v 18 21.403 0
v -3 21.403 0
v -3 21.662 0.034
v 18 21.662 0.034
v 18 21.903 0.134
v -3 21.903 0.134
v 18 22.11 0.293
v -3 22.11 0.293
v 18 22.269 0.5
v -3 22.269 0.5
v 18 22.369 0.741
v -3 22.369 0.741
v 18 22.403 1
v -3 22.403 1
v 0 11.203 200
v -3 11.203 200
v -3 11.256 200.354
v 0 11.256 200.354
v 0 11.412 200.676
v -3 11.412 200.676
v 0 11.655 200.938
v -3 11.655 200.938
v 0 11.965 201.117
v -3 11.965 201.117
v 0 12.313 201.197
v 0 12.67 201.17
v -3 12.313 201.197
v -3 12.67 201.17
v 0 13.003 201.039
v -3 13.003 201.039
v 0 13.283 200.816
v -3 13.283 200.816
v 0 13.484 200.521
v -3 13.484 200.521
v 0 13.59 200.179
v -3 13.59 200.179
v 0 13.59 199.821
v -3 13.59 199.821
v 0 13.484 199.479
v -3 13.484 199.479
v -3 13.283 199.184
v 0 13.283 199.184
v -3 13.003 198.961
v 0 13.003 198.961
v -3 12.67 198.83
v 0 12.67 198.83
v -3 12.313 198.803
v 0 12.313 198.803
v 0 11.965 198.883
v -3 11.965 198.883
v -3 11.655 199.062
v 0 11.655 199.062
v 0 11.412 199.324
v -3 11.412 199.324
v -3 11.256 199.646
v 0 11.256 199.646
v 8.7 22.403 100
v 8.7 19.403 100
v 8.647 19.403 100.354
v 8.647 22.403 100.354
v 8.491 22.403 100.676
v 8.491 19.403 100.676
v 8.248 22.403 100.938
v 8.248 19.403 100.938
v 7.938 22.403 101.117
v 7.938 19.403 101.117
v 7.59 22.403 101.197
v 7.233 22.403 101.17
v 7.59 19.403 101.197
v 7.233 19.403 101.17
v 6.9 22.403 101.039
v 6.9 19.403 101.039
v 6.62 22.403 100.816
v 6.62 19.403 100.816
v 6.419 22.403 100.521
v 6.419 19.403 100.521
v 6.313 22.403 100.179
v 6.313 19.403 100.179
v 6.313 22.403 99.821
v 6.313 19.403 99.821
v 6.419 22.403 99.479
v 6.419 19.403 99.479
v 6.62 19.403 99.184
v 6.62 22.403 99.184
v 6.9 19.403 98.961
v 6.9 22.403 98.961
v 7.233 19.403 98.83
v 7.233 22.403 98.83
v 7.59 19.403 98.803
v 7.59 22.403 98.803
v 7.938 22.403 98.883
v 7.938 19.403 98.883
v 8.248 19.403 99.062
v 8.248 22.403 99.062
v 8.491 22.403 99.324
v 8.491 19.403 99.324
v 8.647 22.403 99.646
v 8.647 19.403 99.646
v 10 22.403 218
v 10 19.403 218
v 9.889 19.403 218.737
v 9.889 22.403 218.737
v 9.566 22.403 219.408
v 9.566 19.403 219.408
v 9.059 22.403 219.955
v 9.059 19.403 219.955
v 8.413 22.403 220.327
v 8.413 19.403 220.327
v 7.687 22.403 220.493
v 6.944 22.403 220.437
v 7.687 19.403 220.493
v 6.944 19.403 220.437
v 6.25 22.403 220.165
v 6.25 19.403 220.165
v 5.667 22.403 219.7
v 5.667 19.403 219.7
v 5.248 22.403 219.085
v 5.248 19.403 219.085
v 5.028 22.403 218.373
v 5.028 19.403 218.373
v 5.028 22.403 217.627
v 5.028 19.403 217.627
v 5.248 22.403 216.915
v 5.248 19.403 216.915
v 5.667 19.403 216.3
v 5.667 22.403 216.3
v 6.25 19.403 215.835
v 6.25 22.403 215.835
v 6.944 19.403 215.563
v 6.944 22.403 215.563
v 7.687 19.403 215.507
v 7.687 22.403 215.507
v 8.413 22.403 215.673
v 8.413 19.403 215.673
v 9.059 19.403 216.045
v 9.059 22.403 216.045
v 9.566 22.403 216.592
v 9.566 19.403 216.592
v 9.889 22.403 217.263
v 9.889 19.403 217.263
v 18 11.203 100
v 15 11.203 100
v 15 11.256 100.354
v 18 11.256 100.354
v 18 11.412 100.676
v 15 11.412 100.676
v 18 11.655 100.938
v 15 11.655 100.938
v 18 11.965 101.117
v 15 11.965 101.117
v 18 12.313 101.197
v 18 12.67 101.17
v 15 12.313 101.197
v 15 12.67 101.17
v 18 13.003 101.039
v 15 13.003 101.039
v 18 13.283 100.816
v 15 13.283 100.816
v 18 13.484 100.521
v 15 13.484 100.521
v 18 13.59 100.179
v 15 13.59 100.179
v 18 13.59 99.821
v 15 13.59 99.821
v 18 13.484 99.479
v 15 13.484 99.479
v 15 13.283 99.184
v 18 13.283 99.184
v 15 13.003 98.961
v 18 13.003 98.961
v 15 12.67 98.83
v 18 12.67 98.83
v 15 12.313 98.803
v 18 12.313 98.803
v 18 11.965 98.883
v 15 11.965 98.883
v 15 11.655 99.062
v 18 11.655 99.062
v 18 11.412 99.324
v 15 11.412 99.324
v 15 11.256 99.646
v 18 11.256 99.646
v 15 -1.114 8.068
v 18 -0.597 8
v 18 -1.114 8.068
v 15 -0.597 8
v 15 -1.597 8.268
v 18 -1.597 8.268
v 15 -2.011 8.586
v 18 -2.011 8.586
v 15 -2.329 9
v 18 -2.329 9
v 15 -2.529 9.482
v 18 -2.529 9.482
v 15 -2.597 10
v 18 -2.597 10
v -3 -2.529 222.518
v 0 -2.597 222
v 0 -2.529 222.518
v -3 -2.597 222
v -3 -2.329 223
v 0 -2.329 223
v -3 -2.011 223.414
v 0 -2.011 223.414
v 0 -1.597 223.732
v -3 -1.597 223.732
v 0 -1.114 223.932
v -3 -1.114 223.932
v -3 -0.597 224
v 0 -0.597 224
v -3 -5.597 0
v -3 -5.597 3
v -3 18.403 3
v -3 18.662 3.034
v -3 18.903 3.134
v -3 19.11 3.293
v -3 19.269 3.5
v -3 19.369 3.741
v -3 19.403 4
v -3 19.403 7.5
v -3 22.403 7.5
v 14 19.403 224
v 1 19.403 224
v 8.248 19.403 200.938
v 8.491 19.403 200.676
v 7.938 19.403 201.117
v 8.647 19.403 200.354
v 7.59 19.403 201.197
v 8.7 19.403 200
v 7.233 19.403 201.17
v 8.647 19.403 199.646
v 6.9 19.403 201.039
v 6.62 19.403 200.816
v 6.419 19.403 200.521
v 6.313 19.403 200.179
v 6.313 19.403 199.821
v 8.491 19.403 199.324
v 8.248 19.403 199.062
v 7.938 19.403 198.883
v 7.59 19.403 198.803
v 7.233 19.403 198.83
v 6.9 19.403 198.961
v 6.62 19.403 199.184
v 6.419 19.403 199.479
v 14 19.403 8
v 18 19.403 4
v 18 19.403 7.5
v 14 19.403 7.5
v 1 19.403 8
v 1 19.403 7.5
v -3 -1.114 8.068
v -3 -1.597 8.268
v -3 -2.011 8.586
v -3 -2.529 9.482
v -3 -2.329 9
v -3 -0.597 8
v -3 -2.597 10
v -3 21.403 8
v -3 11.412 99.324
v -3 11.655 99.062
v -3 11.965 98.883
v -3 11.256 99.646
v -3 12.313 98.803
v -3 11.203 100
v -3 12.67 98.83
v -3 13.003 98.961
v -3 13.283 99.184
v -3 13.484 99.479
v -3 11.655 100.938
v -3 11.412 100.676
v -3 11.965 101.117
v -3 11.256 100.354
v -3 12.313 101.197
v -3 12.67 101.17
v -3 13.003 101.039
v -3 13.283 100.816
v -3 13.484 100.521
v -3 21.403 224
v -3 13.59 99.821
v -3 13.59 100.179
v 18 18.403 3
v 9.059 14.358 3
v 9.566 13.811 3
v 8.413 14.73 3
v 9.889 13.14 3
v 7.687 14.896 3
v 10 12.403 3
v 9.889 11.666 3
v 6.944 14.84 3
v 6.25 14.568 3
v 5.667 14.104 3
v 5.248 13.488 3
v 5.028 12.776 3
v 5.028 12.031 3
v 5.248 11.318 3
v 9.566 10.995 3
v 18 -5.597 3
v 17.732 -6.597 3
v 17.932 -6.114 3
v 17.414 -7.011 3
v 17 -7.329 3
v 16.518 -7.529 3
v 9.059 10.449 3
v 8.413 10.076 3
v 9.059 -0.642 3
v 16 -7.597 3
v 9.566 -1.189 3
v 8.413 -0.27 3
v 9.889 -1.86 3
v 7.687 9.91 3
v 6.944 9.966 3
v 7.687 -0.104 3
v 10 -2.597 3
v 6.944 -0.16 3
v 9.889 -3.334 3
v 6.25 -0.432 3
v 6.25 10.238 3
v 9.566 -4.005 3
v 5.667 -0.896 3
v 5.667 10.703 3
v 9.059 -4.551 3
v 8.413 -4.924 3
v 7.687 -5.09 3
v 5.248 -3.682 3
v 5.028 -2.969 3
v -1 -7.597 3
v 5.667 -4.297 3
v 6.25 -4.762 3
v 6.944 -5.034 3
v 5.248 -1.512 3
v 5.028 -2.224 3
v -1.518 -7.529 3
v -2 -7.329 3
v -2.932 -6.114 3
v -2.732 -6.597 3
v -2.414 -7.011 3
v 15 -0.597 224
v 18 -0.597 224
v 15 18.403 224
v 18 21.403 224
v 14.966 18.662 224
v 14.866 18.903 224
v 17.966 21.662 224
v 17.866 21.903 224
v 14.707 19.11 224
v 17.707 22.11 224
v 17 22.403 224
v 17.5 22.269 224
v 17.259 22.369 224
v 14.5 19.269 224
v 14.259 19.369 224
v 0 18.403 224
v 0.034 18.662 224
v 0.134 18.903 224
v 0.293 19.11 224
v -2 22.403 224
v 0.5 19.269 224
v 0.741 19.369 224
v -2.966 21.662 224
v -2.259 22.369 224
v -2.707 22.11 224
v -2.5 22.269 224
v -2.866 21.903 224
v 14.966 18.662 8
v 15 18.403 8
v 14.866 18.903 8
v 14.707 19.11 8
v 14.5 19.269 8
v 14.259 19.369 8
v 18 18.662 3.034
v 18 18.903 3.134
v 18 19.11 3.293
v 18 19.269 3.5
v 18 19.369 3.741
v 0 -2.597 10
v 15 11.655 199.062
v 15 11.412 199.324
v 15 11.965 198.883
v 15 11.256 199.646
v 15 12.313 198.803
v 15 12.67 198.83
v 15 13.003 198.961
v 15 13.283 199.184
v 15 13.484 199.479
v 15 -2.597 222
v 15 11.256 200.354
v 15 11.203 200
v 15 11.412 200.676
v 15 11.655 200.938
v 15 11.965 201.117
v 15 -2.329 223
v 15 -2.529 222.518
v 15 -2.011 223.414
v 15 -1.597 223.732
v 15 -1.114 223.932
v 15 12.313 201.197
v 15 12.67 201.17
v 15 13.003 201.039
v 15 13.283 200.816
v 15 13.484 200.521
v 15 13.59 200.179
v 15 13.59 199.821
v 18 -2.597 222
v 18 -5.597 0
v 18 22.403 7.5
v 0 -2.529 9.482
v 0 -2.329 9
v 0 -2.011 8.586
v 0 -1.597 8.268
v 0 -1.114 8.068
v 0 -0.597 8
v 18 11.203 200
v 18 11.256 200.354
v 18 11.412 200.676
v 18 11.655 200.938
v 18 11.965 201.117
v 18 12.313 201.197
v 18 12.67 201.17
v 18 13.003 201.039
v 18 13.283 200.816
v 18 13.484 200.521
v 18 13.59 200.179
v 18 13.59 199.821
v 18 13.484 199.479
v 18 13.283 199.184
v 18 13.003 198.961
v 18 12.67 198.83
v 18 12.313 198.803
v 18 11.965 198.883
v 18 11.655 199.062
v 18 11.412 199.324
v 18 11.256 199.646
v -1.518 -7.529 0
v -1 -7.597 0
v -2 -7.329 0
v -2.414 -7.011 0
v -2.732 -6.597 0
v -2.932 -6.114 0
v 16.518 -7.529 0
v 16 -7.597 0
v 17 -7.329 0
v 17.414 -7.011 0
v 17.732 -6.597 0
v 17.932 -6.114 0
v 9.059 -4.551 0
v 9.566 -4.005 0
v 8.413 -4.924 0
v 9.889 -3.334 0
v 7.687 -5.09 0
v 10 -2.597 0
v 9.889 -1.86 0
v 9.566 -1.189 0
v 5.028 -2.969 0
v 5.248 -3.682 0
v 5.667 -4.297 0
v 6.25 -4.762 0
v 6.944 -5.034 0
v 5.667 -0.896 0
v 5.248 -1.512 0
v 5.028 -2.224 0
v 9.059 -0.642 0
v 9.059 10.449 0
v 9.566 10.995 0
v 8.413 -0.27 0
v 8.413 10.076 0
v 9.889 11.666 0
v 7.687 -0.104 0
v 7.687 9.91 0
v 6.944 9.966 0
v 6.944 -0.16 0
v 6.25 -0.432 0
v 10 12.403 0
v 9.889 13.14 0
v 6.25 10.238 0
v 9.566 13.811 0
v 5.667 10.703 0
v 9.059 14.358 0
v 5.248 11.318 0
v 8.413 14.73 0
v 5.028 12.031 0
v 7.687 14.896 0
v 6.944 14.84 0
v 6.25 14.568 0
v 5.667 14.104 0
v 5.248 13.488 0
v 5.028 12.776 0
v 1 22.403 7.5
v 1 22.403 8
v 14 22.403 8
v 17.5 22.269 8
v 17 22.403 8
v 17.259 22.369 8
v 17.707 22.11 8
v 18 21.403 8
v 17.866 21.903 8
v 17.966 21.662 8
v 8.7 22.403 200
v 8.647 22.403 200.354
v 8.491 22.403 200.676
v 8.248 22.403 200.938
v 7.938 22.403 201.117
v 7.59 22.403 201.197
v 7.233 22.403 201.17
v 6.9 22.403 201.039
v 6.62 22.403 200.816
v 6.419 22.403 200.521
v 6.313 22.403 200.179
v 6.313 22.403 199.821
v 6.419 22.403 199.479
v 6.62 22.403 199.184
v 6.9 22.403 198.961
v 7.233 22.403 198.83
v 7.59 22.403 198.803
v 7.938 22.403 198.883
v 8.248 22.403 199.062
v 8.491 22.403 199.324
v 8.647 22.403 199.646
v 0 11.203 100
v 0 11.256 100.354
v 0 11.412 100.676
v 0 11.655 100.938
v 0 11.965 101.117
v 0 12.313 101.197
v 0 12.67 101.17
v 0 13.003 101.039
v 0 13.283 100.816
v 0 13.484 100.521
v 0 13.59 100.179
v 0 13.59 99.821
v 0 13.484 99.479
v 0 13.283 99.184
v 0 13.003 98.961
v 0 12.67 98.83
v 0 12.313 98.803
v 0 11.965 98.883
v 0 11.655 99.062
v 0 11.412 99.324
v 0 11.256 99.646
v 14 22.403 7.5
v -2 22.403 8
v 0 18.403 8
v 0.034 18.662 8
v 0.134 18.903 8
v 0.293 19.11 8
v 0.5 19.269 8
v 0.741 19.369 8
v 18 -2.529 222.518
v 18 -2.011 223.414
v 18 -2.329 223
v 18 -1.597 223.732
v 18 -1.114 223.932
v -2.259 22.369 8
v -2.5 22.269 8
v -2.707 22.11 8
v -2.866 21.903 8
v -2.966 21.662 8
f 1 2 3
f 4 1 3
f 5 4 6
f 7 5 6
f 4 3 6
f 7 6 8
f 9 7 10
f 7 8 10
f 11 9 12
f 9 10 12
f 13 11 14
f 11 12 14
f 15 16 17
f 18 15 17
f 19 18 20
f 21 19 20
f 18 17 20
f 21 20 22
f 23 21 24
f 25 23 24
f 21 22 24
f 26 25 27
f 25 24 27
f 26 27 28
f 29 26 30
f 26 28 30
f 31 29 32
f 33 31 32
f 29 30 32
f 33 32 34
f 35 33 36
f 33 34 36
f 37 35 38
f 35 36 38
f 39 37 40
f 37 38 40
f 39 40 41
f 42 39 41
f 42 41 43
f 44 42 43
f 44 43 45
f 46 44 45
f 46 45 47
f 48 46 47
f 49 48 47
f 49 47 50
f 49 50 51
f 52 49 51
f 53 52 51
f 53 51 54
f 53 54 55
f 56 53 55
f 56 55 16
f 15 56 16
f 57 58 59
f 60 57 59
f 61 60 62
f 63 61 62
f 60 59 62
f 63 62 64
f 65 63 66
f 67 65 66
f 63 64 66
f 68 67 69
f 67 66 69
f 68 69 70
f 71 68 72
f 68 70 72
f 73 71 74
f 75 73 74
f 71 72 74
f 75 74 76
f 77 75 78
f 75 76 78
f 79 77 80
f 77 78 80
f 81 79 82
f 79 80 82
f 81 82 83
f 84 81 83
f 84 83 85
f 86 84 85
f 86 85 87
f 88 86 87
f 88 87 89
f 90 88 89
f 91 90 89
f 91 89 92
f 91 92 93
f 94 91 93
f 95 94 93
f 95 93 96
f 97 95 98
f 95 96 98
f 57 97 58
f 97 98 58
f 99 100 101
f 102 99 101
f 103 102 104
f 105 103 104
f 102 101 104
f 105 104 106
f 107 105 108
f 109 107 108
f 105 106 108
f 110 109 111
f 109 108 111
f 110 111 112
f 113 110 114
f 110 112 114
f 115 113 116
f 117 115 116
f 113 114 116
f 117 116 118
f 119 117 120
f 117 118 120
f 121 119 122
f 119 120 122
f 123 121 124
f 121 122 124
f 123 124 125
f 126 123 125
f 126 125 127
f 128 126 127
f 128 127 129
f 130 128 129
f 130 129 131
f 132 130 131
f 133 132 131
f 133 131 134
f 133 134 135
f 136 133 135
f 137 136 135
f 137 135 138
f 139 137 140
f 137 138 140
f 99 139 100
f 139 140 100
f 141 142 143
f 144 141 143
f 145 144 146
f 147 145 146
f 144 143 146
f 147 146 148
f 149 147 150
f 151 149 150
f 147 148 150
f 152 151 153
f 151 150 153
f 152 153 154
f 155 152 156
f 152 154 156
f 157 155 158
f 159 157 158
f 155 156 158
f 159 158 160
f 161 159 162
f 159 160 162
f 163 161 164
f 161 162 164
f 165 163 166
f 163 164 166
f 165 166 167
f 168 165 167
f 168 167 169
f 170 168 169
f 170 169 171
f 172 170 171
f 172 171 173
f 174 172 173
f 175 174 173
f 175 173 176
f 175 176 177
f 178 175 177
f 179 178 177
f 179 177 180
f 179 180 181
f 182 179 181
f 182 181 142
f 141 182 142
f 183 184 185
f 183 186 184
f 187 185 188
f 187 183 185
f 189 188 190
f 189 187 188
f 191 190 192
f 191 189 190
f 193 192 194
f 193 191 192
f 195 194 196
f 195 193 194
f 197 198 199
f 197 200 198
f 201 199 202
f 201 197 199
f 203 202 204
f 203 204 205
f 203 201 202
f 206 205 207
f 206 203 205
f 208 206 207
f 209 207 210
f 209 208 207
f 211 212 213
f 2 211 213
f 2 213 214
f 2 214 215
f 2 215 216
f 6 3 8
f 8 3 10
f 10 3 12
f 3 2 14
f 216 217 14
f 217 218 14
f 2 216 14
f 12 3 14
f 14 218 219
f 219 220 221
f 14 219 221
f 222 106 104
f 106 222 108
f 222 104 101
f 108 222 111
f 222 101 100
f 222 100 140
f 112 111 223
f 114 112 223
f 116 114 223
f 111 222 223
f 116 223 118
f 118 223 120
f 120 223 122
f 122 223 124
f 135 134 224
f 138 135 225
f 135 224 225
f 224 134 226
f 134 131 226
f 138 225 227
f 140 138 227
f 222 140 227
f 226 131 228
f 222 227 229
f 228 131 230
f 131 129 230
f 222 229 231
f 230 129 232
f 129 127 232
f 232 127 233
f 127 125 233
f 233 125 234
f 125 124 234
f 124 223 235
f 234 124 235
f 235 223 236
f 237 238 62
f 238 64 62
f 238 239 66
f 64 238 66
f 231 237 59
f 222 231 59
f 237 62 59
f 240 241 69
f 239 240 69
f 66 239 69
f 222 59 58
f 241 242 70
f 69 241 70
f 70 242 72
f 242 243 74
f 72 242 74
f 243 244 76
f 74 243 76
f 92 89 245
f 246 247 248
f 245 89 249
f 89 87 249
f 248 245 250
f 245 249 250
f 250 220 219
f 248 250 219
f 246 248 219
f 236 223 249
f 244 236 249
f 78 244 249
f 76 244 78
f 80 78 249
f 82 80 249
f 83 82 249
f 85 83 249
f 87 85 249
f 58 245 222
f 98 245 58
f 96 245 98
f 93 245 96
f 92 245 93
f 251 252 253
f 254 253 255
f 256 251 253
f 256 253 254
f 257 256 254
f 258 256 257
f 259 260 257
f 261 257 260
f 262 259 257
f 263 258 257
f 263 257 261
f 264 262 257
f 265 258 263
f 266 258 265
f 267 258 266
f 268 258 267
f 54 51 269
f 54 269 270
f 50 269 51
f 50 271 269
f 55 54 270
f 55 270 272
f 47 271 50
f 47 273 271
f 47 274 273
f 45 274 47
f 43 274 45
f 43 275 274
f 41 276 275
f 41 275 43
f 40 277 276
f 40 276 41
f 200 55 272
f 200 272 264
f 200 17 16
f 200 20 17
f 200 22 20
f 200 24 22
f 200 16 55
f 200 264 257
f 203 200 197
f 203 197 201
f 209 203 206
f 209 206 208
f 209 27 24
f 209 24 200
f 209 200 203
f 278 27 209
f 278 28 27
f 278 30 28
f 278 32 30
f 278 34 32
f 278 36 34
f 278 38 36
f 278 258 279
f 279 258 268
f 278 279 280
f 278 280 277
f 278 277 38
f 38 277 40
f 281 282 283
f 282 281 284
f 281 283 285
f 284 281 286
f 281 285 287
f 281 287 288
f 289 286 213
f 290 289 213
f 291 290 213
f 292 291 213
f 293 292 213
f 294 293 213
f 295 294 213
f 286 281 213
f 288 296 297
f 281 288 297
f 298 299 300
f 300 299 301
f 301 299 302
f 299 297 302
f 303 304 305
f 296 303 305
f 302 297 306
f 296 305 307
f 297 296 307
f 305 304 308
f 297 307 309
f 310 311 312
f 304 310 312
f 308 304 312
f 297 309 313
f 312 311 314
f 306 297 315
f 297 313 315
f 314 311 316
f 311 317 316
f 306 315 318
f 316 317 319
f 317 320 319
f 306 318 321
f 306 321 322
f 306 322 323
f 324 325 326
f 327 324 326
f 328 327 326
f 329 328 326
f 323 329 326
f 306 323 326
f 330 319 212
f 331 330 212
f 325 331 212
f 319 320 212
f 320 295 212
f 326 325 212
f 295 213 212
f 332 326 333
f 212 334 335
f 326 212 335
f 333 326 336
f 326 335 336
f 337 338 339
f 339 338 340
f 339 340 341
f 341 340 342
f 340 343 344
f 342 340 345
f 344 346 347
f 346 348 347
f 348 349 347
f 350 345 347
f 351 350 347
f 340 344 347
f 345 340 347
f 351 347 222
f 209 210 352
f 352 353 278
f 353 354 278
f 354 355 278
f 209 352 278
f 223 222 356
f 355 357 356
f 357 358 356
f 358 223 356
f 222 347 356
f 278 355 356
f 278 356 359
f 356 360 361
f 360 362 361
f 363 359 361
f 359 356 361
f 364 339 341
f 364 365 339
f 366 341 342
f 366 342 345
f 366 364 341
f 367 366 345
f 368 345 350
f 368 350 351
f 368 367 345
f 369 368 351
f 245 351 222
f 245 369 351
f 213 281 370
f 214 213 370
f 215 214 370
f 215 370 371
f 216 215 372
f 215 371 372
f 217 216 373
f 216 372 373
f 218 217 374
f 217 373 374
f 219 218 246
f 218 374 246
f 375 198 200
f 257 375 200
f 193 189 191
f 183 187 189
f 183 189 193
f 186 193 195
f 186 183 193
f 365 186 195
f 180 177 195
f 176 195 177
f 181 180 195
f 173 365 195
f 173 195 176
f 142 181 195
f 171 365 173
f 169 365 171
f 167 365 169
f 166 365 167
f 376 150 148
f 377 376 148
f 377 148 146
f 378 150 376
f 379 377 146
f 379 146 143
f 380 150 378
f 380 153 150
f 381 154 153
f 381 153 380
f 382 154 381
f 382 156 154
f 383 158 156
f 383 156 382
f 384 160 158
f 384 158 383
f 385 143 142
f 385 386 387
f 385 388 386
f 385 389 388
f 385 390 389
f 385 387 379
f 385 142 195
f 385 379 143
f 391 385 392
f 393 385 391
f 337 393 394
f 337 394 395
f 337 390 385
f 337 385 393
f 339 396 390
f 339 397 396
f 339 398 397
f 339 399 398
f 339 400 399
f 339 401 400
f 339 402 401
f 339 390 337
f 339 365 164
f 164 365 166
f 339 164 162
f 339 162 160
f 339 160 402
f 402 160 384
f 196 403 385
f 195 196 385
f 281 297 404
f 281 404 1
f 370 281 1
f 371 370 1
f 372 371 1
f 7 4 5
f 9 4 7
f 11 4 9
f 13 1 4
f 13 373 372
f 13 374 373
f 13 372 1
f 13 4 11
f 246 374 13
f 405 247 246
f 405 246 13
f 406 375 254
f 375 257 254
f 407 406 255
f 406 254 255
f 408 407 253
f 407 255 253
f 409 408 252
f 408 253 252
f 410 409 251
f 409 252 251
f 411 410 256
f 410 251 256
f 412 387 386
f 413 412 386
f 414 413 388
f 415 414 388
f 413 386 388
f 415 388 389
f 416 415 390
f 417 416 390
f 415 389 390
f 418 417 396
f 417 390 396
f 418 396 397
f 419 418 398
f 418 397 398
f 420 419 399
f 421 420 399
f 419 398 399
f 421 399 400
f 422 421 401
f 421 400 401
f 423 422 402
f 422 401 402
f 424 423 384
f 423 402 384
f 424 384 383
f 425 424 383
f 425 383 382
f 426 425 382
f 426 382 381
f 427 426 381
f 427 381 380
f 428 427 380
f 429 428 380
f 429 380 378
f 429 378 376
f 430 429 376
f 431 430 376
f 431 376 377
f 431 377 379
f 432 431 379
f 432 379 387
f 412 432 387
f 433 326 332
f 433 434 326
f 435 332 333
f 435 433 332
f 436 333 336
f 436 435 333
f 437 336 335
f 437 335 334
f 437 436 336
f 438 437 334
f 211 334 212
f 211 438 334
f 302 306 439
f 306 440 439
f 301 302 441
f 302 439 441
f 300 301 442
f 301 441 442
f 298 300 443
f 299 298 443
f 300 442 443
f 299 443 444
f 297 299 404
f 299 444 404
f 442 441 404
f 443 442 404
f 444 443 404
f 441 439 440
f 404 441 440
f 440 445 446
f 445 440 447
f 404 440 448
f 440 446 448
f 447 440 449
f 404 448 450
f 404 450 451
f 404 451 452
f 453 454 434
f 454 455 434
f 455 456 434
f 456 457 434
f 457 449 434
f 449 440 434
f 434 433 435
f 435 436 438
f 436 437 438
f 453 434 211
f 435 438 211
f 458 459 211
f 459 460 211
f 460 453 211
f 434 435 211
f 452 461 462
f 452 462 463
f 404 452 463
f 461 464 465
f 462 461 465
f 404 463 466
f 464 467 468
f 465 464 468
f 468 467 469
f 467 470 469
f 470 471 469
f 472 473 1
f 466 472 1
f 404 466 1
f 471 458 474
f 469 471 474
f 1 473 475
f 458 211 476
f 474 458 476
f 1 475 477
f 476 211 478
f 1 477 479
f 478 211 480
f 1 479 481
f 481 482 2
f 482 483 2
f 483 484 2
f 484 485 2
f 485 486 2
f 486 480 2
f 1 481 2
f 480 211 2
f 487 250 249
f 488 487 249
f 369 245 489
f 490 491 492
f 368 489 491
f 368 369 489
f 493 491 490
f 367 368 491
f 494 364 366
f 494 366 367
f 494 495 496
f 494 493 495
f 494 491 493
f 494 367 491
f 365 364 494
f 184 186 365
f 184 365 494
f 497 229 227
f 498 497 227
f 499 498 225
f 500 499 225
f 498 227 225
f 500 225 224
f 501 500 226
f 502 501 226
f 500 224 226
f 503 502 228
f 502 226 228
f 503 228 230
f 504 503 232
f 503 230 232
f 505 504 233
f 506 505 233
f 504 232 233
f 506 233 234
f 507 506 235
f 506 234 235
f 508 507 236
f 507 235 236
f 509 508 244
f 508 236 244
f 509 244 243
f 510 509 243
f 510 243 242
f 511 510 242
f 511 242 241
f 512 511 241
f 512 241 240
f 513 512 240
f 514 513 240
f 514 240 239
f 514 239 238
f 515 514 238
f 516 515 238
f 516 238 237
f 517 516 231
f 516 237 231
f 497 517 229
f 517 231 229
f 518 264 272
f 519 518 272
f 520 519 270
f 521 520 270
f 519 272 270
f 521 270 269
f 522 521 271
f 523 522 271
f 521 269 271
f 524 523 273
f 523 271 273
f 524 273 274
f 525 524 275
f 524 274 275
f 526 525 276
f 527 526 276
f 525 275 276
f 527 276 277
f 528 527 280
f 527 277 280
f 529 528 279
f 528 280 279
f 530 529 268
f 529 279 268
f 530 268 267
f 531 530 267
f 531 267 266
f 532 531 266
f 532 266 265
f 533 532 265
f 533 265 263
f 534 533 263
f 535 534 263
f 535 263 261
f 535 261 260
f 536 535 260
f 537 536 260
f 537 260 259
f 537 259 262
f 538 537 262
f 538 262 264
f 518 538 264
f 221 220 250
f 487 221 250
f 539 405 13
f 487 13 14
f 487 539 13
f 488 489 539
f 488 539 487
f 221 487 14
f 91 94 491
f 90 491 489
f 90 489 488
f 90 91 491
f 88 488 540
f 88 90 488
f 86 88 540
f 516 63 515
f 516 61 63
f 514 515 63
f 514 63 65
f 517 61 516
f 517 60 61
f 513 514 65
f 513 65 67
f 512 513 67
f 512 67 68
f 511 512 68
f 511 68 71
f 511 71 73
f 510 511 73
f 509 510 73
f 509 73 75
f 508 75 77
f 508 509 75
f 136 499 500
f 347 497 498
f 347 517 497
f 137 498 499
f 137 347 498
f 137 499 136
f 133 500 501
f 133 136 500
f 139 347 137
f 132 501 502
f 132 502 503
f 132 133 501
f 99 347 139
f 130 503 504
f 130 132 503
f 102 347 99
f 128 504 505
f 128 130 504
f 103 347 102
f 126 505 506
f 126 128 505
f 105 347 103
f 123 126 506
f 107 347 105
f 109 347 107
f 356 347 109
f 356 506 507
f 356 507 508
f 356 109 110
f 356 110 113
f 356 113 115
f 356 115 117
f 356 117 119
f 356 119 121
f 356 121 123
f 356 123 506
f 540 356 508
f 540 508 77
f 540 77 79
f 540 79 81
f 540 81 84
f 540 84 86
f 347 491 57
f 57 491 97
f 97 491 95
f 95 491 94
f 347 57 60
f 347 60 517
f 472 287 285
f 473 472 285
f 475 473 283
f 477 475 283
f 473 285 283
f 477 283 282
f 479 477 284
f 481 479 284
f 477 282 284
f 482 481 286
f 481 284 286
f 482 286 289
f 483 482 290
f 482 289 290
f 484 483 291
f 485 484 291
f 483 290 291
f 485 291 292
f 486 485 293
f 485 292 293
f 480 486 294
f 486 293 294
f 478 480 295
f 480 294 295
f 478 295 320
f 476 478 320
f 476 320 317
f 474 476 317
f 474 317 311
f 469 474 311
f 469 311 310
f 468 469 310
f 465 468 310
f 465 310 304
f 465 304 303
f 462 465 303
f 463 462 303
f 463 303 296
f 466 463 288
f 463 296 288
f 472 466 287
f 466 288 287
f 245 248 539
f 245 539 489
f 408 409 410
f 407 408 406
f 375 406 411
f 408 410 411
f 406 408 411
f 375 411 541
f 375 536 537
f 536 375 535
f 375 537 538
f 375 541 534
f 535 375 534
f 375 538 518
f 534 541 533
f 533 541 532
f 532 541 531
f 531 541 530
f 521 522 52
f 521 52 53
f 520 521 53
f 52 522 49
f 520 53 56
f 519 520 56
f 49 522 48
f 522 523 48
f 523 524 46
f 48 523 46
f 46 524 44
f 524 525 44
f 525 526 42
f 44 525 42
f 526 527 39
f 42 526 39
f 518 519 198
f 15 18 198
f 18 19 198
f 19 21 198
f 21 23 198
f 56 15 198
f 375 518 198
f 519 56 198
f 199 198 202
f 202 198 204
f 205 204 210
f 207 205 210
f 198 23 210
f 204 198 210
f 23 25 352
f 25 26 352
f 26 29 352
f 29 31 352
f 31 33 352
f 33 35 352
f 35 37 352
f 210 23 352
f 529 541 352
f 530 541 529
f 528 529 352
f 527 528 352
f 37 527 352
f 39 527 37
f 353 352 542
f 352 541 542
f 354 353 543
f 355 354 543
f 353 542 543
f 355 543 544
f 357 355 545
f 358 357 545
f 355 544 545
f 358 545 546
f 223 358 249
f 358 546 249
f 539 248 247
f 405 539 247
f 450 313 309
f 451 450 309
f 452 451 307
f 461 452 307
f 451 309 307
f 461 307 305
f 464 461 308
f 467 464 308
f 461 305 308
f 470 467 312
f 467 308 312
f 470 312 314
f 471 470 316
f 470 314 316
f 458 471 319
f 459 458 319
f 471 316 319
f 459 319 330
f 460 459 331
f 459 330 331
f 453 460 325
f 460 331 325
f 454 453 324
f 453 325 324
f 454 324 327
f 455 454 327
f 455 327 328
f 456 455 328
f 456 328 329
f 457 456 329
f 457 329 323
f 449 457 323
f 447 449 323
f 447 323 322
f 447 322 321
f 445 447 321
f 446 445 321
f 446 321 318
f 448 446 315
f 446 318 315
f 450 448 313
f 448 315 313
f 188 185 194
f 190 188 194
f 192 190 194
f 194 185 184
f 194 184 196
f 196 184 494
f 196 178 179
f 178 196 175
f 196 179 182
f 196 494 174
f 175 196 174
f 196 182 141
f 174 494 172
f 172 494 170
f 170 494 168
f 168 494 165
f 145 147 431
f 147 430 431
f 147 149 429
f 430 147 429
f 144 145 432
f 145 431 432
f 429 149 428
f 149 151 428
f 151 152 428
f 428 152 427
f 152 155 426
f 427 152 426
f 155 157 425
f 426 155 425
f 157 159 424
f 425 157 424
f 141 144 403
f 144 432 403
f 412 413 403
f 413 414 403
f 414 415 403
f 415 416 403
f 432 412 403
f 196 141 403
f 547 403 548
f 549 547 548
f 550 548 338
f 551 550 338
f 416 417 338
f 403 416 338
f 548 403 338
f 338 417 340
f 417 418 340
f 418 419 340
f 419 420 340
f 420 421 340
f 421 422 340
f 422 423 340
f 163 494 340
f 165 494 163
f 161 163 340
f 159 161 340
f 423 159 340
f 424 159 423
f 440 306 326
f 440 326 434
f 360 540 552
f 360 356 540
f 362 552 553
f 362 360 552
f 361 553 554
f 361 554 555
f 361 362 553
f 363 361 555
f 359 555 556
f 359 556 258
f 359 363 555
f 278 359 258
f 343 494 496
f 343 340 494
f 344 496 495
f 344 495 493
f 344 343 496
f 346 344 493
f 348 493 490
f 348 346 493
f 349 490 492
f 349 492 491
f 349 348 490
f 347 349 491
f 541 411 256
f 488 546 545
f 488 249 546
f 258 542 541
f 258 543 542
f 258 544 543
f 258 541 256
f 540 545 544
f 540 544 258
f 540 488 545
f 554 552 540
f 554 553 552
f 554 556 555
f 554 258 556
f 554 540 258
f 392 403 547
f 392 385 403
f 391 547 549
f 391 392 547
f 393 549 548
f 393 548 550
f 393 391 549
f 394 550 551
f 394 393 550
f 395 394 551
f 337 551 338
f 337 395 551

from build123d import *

# Parameters (mm, degrees)
F1_DEPTH  = 15
F2_W      = 3
F2_H      = 216
F3_DEPTH  = 25
F4_R      = 2.5
F5_DEPTH  = 3
F6_W      = 1
F6_H      = 0.5
F7_DEPTH  = 3
F8_R      = 1
F9_R      = 2.5
F9_R_2    = 1.2
F10_DEPTH = 3
F11_R     = 1.2
F12_DEPTH = 34.2
F13_DEPTH = 3
F14_R     = 2


with BuildPart() as f1:
    # F0 (on Right) → F1 (new body)
    with BuildSketch(Plane.YZ):
        Polygon((-7.5968508422, 3), (-7.5968508422, 0), (22.4031491578, 0), (22.4031491578, 224), (19.4031491578, 224), (19.4031491578, 3), align=None)
    extrude(amount=F1_DEPTH)

    # F2 (on face) → F3 (join)
    with BuildSketch(Plane(origin=(0, 22.4031491578, 0), x_dir=(-1, 0, 0), z_dir=(0, 1, 0))):
        with Locations((1.5, 116)):
            Rectangle(F2_W, F2_H)
        with Locations((-16.5, 116)):
            Rectangle(F2_W, F2_H)
    extrude(amount=-F3_DEPTH)

    # F4 (on face) → F5 (cut)
    with BuildSketch(Plane.XY.offset(3)):
        with Locations((7.5, -2.5968508422)):
            Circle(F4_R)
        with Locations((7.5, 12.4031491578)):
            Circle(F4_R)
    extrude(amount=-F5_DEPTH, mode=Mode.SUBTRACT)

    # F6 (on face) → F7 (cut)
    with BuildSketch(Plane.XZ.offset(-19.4031491578)):
        with Locations((0.5, 7.75)):
            Rectangle(F6_W, F6_H)
        with Locations((14.5, 7.75)):
            Rectangle(F6_W, F6_H)
    extrude(amount=-F7_DEPTH, mode=Mode.SUBTRACT)

    # F8
    f8_edges = [f1.edges().sort_by_distance(p)[0] for p in [
        (7.5, 19.403149, 3),
        (7.5, 22.403149, 0),
        (0, 19.403149, 116),
        (-3, 22.403149, 116),
        (18, 22.403149, 116),
        (15, 19.403149, 116),
    ]]
    fillet(f8_edges, radius=F8_R)

    # F9 (on face) → F10 (cut)
    with BuildSketch(Plane.XZ.offset(-19.4031491578)):
        with Locations((7.5, 218)):
            Circle(F9_R)
        with Locations((7.5, 100)):
            Circle(F9_R_2)
        with Locations((7.5, 200)):
            Circle(F9_R_2)
    extrude(amount=-F10_DEPTH, mode=Mode.SUBTRACT)

    # F11 (on face) → F12 (cut)
    with BuildSketch(Plane(origin=(-3, 0, 0), x_dir=(0, -1, 0), z_dir=(-1, 0, 0))):
        with Locations((-12.4031491578, 200)):
            Circle(F11_R)
        with Locations((-12.4031491578, 100)):
            Circle(F11_R)
    extrude(amount=-F12_DEPTH, mode=Mode.SUBTRACT)

    # F13 (add, symmetric): faces of the model
    f13_faces = [f1.faces().sort_by_distance(p)[0] for p in [
        (0, 9.1577983799, 1.9953507779),
        (15, 9.1577983799, 1.9953507779),
    ]]
    extrude(f13_faces, amount=F13_DEPTH, both=True, dir=(-1, 0, 0))

    # F14
    f14_edges = [f1.edges().sort_by_distance(p)[0] for p in [
        (-3, -7.596851, 1.5),
        (18, -7.596851, 1.5),
        (-1.5, -2.596851, 8),
        (16.5, -2.596851, 8),
        (-1.5, -2.596851, 224),
        (16.5, -2.596851, 224),
    ]]
    fillet(f14_edges, radius=F14_R)


solid = f1.part
